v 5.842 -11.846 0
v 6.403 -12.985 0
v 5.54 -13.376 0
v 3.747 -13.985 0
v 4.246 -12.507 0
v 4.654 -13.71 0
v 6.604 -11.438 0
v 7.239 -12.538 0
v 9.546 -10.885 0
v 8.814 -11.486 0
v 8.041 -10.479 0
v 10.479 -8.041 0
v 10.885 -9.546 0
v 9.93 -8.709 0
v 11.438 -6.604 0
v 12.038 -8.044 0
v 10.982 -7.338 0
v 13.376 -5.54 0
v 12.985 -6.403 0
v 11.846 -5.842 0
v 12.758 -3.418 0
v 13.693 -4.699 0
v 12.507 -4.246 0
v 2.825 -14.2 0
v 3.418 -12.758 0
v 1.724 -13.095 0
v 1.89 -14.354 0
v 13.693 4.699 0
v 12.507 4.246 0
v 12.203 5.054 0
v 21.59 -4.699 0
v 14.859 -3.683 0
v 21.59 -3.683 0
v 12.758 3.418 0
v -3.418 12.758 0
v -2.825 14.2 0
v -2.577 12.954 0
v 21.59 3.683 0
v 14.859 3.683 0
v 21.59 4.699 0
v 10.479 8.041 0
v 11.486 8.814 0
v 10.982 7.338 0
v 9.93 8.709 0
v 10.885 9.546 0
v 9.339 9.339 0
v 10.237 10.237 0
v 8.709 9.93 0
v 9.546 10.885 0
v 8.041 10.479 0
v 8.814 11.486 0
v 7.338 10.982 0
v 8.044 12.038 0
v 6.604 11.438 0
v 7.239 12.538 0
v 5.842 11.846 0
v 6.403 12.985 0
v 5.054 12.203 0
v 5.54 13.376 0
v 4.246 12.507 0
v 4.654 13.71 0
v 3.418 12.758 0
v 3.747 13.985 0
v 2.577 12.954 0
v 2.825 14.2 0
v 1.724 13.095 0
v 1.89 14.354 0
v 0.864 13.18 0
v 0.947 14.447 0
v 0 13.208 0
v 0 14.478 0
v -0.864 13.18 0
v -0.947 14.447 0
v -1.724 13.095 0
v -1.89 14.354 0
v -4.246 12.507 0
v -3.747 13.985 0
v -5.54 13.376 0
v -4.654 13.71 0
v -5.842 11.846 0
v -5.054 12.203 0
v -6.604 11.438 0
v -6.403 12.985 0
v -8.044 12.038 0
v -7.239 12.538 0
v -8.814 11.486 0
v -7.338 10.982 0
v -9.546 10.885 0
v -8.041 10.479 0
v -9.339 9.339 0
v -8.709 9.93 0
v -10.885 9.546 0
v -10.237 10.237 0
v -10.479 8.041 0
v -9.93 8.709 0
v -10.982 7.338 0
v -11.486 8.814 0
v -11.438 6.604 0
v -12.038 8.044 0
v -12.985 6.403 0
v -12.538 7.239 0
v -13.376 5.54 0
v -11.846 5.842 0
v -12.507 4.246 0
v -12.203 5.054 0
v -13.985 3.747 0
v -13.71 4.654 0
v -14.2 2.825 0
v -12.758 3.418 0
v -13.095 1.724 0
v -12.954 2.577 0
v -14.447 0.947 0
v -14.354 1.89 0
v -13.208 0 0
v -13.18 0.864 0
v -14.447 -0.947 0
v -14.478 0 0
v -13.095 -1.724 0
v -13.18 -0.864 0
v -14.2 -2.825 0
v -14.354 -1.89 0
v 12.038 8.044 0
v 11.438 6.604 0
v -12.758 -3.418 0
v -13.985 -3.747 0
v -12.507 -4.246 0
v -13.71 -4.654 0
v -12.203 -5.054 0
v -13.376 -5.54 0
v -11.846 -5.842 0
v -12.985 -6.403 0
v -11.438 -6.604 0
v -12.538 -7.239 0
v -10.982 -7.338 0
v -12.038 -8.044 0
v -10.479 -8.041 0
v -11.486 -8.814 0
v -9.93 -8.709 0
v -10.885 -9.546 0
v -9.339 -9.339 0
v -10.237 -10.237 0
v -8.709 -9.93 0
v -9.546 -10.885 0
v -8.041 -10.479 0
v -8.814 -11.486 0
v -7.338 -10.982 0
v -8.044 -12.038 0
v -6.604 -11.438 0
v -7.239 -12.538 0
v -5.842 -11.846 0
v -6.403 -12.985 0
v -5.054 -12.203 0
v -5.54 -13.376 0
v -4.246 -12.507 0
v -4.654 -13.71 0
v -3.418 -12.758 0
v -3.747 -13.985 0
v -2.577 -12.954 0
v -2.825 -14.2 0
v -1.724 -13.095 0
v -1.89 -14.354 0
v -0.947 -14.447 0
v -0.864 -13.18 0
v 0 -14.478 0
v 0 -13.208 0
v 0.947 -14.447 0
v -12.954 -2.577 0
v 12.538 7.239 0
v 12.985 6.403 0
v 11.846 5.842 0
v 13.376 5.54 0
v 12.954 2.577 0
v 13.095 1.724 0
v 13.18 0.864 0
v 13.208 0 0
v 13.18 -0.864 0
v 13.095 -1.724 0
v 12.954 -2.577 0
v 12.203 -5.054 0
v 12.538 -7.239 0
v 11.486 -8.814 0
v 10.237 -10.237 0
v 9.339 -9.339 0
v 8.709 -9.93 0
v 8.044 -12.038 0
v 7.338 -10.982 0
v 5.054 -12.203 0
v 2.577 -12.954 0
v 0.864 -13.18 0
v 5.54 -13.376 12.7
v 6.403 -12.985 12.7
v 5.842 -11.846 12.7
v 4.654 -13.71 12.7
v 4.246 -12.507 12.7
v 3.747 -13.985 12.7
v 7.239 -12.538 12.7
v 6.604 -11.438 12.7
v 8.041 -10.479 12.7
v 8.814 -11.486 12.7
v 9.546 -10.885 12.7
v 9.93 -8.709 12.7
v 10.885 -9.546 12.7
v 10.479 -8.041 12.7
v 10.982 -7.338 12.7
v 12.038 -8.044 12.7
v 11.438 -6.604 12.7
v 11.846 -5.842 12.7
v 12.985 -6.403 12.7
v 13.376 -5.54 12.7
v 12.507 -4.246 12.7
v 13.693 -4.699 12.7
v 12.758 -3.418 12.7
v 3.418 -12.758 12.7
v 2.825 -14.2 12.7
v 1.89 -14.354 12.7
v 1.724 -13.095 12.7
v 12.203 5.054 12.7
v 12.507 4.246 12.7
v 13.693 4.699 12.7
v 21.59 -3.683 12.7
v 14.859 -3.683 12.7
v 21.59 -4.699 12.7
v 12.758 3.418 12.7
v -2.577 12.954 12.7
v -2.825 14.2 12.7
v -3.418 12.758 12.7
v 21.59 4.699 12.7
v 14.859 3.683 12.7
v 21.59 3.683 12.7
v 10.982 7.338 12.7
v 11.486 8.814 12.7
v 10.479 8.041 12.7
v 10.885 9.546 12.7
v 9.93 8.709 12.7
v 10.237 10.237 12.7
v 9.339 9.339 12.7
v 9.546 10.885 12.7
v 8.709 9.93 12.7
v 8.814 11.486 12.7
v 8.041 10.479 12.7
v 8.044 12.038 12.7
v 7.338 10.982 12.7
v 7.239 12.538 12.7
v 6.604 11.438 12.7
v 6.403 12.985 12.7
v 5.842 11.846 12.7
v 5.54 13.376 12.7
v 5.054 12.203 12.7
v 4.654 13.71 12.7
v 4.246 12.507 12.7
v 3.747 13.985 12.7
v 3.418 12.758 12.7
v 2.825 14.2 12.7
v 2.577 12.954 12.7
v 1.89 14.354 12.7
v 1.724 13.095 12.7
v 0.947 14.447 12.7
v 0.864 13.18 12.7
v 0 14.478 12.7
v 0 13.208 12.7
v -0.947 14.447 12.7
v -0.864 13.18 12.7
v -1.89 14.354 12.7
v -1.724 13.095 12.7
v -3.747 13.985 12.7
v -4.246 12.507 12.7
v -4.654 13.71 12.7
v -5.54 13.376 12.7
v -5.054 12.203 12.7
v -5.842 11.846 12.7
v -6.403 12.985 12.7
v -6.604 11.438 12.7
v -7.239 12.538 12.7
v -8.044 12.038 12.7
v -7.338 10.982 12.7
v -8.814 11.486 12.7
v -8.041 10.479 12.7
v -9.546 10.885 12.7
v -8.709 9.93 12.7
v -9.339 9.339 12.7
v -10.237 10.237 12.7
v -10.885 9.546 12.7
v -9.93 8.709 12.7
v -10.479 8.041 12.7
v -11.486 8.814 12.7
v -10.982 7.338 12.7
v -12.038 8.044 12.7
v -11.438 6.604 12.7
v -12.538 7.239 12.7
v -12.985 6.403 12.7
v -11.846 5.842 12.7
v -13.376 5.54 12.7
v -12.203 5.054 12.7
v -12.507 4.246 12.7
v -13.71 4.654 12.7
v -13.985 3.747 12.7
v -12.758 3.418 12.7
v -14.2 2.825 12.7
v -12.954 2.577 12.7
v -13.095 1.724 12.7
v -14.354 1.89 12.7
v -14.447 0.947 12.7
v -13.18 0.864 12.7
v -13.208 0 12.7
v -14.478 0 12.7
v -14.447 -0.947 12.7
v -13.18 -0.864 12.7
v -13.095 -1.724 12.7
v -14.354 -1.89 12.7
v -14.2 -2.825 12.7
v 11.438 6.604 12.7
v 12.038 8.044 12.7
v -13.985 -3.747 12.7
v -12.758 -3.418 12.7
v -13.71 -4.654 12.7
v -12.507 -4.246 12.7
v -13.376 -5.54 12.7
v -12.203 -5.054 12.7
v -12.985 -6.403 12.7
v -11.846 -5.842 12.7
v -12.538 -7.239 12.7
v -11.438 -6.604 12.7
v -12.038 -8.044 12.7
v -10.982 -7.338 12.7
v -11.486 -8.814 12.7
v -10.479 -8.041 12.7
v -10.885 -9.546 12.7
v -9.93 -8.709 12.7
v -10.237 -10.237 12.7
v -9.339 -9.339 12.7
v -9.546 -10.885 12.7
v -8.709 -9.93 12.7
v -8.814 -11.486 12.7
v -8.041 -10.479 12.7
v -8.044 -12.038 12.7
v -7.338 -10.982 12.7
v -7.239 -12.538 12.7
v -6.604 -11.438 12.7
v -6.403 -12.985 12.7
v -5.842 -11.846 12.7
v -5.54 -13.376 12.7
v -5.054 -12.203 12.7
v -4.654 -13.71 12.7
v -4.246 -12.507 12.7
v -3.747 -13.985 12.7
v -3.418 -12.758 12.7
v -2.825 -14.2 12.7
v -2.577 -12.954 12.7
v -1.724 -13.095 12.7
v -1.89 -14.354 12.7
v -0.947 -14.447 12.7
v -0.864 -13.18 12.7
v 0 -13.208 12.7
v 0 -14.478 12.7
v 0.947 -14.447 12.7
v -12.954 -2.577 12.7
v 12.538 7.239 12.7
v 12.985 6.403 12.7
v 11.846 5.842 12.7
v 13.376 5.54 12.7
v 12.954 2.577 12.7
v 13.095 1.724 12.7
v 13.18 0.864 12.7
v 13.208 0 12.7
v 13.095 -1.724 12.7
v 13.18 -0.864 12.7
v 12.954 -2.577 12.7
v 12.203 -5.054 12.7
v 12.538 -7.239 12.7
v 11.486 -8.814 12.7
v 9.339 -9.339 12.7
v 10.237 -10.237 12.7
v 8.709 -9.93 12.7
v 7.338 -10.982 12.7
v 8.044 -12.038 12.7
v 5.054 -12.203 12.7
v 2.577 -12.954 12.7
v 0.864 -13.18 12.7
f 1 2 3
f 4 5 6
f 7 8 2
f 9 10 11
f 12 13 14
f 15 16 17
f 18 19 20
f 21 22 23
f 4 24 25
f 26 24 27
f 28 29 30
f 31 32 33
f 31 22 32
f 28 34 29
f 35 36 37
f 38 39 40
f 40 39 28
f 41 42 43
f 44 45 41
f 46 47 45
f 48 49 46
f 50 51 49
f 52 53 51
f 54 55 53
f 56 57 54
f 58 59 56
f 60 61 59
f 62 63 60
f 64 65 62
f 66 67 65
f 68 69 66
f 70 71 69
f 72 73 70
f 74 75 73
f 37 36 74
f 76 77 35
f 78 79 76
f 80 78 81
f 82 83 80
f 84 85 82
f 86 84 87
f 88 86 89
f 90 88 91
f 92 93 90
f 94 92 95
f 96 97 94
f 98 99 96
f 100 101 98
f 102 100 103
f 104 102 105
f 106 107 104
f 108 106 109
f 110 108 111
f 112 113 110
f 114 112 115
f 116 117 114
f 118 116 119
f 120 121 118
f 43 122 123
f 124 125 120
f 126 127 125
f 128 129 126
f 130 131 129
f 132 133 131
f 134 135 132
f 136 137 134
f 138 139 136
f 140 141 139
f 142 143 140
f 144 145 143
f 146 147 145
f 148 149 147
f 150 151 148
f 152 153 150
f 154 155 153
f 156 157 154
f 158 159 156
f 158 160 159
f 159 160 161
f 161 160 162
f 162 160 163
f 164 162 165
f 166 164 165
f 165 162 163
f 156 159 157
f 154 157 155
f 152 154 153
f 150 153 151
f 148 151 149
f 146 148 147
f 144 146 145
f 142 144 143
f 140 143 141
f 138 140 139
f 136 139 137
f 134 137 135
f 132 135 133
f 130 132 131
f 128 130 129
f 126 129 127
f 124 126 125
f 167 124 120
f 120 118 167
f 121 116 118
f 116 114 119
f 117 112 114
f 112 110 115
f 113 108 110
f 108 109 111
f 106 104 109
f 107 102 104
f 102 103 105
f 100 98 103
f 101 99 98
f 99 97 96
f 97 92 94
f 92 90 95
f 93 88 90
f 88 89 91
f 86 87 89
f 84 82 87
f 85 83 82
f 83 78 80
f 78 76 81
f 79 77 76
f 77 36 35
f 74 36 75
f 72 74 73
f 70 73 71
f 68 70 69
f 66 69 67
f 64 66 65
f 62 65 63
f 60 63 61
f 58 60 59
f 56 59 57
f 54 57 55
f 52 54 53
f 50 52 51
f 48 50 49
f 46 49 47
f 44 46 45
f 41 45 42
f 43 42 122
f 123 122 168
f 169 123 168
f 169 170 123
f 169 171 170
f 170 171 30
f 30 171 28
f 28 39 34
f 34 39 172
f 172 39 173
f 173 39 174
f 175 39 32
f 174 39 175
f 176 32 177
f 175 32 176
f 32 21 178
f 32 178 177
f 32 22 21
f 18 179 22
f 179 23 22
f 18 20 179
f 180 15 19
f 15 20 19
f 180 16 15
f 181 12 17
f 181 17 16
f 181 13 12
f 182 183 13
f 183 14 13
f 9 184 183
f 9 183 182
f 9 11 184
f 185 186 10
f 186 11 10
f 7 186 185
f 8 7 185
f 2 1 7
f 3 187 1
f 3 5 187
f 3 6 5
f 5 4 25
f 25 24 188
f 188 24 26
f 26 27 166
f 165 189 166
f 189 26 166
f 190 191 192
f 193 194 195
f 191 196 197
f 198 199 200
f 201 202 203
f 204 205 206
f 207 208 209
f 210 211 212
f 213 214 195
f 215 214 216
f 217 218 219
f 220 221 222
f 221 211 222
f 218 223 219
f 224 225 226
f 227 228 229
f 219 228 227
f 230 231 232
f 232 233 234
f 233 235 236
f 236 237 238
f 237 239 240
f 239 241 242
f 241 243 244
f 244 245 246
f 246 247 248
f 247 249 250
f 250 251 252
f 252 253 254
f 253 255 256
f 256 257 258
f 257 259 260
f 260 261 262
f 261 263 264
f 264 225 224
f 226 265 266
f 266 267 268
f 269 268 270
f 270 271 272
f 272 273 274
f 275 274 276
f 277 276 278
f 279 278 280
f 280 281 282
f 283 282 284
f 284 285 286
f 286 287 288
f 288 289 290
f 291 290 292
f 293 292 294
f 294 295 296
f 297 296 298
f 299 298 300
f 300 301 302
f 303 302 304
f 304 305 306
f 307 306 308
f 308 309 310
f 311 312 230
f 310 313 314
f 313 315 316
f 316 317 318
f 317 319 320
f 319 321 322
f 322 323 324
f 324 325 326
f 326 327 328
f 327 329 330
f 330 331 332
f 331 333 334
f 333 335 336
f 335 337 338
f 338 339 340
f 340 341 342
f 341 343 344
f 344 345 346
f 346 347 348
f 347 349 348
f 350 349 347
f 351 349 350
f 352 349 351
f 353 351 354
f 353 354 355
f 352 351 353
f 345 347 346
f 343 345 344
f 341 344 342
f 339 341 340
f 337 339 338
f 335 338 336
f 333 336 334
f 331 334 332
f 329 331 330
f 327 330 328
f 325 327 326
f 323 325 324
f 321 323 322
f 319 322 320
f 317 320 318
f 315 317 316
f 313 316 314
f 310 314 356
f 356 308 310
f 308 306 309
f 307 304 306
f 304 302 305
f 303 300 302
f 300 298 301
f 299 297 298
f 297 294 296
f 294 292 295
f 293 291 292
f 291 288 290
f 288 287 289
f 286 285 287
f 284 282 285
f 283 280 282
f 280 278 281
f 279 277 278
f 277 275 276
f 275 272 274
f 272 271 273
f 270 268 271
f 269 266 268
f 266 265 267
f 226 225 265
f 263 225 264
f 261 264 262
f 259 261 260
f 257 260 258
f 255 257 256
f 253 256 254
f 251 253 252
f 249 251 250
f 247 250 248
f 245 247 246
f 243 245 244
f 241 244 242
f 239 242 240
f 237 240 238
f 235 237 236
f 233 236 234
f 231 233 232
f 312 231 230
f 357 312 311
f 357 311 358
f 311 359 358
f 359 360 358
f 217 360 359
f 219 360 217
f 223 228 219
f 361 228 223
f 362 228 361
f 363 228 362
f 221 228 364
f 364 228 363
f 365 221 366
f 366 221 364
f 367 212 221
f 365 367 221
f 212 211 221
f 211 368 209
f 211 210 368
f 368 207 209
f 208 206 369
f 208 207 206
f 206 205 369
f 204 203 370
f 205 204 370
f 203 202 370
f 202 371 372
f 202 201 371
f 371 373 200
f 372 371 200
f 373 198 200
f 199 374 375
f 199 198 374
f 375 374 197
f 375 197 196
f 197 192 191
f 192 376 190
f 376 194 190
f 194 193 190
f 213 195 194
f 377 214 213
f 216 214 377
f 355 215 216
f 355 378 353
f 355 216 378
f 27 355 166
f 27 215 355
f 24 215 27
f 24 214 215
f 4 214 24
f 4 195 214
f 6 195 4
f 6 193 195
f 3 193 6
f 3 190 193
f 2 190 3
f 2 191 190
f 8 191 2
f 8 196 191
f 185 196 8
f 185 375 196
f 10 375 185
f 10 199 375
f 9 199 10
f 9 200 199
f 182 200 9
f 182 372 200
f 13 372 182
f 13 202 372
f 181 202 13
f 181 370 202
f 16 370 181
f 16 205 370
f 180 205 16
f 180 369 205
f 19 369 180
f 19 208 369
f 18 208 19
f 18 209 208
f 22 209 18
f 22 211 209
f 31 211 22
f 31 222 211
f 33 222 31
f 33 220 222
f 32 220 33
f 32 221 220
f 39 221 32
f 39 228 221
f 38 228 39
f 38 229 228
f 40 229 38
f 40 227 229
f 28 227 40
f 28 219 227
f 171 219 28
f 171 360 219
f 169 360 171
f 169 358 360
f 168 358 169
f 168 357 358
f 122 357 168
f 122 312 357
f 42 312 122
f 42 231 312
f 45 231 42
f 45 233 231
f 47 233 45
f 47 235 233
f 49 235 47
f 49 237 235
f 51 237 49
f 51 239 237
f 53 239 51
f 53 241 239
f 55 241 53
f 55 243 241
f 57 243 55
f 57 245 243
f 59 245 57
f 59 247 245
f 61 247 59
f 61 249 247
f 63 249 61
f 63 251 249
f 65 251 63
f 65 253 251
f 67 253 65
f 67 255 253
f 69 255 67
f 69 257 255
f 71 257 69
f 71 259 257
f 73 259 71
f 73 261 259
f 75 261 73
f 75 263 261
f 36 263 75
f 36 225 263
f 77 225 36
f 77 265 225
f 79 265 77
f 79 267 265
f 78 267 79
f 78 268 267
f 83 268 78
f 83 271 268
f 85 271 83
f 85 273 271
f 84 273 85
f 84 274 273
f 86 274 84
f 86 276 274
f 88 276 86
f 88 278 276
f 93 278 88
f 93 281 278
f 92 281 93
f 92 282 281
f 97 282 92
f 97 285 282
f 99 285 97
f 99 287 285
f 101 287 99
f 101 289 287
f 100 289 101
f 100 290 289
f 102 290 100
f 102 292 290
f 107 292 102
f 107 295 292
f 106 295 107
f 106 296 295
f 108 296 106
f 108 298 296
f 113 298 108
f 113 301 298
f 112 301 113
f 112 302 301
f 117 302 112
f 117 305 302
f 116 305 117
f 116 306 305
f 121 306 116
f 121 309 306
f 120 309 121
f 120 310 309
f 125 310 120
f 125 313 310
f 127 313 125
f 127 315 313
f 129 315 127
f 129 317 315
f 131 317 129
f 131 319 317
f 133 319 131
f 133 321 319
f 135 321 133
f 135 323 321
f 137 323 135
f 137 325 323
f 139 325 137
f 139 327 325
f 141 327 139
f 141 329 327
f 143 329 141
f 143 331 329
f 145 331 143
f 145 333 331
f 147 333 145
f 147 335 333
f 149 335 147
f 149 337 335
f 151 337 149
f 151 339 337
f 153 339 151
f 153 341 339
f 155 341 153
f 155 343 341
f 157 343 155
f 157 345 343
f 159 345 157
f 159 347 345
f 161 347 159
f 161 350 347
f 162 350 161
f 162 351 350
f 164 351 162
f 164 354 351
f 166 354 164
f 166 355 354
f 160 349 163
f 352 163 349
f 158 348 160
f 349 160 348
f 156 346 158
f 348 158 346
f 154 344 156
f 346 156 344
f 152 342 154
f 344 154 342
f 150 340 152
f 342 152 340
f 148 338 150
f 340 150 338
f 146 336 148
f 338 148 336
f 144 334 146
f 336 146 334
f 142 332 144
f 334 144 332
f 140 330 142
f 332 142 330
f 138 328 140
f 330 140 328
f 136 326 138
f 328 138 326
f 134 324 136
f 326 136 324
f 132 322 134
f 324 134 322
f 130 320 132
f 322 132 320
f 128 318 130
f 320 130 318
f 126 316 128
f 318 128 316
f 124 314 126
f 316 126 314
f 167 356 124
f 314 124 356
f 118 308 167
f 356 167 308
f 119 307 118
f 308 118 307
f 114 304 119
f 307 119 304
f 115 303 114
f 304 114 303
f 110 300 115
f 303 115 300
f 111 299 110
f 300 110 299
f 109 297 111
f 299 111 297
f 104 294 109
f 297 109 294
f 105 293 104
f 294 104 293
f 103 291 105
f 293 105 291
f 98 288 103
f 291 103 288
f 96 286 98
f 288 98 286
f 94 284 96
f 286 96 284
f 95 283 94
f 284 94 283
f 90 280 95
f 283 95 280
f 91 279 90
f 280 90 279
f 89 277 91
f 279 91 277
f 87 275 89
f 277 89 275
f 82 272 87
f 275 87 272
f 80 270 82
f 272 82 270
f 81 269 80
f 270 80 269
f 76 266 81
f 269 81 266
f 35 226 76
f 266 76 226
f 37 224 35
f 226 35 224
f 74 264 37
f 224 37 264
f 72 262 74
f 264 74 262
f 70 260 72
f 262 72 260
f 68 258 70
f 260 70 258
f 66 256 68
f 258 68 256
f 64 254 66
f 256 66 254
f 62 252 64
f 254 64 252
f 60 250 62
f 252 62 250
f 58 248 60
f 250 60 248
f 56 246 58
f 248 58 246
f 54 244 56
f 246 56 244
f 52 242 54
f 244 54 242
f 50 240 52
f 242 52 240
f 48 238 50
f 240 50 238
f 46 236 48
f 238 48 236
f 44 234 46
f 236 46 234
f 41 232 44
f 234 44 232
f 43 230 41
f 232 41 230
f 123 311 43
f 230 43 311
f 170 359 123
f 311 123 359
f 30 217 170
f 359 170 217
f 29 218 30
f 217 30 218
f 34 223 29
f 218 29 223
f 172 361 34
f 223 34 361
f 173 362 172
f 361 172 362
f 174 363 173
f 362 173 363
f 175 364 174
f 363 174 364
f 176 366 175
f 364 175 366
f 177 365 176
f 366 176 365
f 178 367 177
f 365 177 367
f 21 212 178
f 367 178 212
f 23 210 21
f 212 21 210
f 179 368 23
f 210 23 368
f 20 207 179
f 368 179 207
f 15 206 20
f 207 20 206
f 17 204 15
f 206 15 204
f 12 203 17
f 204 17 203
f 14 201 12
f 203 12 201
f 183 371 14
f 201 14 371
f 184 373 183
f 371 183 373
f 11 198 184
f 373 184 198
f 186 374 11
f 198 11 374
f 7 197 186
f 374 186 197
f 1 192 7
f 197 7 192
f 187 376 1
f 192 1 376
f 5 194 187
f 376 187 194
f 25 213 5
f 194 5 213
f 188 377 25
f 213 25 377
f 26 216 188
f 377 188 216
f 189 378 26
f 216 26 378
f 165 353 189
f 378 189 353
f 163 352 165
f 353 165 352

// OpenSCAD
ViewScale = [0.0254, 0.0254, 0.0254];

shaftR=500;

module mountring(space)
{
    linear_extrude(500)
    {
        difference()
        {
            circle(shaftR+70, $fn=96);
            circle(shaftR+20, $fn=96);
        }
        difference() 
        {
            translate([500, 0, 0])
            square([700, space+100], center=true);
            circle(shaftR+20, $fn=96);

            translate([720, 0, 0])
            square([270, space+20], center=true);
        }
    }
}

scale(ViewScale)
{
    mountring(270);
}
